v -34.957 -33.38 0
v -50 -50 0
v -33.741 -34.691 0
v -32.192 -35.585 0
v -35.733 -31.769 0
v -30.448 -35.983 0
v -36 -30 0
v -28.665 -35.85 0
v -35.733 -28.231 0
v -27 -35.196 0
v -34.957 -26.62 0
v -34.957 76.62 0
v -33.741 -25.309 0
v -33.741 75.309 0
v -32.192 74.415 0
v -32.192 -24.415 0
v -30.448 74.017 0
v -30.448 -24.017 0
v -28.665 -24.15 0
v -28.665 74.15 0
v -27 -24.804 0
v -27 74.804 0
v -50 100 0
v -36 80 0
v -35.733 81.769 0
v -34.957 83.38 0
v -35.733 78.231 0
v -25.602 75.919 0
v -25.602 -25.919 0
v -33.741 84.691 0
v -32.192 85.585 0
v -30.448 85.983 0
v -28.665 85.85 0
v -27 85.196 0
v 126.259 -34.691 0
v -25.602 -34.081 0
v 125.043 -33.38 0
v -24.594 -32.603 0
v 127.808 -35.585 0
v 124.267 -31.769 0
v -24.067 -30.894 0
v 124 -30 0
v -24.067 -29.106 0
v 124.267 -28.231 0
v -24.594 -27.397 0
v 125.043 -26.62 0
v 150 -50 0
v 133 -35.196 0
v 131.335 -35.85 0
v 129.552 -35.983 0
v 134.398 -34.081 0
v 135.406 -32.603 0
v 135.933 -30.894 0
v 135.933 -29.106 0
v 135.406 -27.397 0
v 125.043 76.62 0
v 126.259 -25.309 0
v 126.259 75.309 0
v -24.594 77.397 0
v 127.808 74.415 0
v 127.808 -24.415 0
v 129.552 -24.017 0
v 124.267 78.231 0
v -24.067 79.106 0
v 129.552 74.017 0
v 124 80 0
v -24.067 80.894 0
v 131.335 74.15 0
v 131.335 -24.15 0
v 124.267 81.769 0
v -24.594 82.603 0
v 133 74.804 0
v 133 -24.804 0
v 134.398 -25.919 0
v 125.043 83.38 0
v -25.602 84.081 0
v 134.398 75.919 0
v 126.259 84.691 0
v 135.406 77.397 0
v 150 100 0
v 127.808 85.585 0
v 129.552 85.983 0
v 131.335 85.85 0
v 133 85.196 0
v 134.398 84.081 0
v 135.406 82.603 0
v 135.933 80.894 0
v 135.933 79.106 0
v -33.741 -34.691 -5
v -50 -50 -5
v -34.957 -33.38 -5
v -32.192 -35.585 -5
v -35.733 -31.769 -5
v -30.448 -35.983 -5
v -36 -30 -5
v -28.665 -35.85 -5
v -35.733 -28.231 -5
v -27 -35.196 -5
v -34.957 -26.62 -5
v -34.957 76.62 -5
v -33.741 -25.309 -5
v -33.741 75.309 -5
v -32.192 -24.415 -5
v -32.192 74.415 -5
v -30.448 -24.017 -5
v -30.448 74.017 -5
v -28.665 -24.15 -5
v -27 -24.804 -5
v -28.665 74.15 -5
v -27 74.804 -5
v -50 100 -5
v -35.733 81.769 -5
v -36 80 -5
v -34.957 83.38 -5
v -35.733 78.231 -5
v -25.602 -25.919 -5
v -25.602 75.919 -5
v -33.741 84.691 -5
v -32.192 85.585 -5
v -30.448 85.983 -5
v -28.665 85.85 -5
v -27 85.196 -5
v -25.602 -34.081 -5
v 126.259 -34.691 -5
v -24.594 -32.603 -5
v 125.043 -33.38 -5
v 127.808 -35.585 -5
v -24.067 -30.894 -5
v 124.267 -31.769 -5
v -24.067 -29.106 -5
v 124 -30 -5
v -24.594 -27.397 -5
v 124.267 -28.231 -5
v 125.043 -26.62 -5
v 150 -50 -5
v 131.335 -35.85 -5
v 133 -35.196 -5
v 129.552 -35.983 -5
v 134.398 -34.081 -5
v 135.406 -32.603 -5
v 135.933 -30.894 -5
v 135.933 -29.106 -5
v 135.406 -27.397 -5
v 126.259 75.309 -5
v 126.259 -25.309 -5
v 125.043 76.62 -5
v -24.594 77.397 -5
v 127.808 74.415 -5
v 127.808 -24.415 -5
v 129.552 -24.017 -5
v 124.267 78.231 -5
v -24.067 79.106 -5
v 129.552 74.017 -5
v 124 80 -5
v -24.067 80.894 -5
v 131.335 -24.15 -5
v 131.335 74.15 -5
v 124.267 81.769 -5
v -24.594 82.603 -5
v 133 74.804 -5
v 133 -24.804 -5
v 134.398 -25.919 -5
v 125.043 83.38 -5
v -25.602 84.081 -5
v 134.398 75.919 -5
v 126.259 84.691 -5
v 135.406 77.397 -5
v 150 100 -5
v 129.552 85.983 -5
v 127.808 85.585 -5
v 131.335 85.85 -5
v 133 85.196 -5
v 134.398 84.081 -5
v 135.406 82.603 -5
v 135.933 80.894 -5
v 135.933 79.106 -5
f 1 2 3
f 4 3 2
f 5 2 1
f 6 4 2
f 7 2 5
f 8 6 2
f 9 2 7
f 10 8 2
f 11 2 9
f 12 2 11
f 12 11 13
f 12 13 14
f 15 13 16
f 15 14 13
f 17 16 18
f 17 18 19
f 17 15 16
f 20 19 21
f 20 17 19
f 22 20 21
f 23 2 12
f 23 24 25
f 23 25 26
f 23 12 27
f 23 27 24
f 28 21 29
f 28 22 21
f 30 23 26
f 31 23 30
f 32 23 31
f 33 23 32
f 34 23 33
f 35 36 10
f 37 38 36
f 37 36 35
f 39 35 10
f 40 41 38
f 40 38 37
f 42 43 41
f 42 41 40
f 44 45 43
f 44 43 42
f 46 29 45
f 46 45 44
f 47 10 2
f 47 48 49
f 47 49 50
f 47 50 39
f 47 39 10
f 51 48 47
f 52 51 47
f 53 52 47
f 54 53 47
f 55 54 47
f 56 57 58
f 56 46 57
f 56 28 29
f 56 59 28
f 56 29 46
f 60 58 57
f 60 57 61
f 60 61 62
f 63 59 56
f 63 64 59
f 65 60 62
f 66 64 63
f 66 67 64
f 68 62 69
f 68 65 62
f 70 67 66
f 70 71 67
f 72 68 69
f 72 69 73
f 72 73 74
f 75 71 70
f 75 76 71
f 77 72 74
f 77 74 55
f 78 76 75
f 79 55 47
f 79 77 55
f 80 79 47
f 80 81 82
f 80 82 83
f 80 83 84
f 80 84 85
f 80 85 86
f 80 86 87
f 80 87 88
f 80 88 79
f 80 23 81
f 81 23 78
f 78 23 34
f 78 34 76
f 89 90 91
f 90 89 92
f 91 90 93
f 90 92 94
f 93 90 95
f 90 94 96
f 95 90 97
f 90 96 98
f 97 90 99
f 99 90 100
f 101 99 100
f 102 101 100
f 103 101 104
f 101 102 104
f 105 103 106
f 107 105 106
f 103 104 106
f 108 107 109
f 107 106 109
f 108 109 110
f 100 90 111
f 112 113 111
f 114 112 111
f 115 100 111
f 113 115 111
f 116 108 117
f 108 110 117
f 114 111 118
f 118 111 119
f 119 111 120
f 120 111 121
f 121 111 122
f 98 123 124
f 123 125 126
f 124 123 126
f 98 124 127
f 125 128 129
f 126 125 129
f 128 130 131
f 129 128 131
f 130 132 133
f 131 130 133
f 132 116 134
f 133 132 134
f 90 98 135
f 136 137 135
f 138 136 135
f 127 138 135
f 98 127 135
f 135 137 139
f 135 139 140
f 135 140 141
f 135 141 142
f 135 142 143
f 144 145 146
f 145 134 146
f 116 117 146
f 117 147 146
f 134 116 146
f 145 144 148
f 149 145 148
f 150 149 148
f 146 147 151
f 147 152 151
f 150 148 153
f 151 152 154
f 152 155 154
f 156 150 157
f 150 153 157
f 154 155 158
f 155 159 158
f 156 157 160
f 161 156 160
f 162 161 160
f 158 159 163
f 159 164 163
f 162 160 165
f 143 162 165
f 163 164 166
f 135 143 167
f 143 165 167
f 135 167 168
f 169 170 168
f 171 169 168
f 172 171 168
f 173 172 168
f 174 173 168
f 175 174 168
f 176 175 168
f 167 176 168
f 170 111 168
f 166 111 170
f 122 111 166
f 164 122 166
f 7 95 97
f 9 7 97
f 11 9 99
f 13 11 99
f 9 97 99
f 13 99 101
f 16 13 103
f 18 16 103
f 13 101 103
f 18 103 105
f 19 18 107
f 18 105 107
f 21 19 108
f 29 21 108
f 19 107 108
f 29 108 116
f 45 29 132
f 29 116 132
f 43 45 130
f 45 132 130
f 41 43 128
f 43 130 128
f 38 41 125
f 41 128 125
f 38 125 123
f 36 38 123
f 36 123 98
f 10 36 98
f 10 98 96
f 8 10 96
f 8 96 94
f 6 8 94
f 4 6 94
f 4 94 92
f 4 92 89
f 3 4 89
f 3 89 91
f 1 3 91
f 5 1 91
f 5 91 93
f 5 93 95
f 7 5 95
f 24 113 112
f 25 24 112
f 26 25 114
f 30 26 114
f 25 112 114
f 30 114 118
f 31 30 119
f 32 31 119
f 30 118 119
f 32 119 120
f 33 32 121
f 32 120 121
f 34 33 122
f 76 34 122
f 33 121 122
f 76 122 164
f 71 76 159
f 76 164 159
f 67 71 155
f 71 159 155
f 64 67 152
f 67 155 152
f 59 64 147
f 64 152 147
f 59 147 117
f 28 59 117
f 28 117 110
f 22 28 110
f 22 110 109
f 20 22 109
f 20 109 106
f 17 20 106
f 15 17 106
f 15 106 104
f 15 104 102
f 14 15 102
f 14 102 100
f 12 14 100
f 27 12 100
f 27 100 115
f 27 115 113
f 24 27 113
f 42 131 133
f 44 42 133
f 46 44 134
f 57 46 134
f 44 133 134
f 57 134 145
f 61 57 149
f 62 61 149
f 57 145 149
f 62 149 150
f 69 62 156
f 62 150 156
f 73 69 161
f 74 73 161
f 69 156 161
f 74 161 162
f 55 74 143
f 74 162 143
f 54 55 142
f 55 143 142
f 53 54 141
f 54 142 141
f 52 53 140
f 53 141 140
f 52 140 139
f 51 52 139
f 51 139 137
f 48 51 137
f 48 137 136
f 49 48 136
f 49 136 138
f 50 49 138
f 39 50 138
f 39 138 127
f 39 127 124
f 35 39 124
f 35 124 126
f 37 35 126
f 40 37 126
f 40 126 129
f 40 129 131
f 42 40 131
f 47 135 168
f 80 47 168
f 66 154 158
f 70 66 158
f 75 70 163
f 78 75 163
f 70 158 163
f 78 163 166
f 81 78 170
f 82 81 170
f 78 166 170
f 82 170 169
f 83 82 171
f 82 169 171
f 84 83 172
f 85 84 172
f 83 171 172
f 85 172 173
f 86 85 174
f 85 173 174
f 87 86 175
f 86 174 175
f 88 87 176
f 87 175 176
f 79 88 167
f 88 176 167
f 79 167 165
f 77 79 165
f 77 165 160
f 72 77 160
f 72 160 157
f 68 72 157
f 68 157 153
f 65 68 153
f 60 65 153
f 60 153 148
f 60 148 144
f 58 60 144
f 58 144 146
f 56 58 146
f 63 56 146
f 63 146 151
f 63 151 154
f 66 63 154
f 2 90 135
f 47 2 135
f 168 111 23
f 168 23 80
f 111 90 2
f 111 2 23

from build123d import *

# Parameters (mm, degrees)
STOCK_POST_1_START     = -5
STOCK_POST_1_OUTLINE_W = 200
STOCK_POST_1_OUTLINE_H = 150
STOCK_POST_1_DEPTH     = 5
F_12_0MM_DOWEL_HOLE1_D = 12


# Read off the part's stored shape, not the designer's step: Stock-Post-1
with BuildPart() as part:
    # Stock-Post-1 outline → Stock-Post-1 (new body)
    with BuildSketch(Plane.XY.offset(STOCK_POST_1_START)):
        with Locations((50, 25)):
            Rectangle(STOCK_POST_1_OUTLINE_W, STOCK_POST_1_OUTLINE_H)
    extrude(amount=STOCK_POST_1_DEPTH)

    # Ø12.0mm Dowel Hole1 (through all)
    with Locations(Plane.XY):
        with Locations((-30, -30), (-30, 80), (130, 80), (130, -30)):
            Hole(F_12_0MM_DOWEL_HOLE1_D / 2)


solid = part.part
